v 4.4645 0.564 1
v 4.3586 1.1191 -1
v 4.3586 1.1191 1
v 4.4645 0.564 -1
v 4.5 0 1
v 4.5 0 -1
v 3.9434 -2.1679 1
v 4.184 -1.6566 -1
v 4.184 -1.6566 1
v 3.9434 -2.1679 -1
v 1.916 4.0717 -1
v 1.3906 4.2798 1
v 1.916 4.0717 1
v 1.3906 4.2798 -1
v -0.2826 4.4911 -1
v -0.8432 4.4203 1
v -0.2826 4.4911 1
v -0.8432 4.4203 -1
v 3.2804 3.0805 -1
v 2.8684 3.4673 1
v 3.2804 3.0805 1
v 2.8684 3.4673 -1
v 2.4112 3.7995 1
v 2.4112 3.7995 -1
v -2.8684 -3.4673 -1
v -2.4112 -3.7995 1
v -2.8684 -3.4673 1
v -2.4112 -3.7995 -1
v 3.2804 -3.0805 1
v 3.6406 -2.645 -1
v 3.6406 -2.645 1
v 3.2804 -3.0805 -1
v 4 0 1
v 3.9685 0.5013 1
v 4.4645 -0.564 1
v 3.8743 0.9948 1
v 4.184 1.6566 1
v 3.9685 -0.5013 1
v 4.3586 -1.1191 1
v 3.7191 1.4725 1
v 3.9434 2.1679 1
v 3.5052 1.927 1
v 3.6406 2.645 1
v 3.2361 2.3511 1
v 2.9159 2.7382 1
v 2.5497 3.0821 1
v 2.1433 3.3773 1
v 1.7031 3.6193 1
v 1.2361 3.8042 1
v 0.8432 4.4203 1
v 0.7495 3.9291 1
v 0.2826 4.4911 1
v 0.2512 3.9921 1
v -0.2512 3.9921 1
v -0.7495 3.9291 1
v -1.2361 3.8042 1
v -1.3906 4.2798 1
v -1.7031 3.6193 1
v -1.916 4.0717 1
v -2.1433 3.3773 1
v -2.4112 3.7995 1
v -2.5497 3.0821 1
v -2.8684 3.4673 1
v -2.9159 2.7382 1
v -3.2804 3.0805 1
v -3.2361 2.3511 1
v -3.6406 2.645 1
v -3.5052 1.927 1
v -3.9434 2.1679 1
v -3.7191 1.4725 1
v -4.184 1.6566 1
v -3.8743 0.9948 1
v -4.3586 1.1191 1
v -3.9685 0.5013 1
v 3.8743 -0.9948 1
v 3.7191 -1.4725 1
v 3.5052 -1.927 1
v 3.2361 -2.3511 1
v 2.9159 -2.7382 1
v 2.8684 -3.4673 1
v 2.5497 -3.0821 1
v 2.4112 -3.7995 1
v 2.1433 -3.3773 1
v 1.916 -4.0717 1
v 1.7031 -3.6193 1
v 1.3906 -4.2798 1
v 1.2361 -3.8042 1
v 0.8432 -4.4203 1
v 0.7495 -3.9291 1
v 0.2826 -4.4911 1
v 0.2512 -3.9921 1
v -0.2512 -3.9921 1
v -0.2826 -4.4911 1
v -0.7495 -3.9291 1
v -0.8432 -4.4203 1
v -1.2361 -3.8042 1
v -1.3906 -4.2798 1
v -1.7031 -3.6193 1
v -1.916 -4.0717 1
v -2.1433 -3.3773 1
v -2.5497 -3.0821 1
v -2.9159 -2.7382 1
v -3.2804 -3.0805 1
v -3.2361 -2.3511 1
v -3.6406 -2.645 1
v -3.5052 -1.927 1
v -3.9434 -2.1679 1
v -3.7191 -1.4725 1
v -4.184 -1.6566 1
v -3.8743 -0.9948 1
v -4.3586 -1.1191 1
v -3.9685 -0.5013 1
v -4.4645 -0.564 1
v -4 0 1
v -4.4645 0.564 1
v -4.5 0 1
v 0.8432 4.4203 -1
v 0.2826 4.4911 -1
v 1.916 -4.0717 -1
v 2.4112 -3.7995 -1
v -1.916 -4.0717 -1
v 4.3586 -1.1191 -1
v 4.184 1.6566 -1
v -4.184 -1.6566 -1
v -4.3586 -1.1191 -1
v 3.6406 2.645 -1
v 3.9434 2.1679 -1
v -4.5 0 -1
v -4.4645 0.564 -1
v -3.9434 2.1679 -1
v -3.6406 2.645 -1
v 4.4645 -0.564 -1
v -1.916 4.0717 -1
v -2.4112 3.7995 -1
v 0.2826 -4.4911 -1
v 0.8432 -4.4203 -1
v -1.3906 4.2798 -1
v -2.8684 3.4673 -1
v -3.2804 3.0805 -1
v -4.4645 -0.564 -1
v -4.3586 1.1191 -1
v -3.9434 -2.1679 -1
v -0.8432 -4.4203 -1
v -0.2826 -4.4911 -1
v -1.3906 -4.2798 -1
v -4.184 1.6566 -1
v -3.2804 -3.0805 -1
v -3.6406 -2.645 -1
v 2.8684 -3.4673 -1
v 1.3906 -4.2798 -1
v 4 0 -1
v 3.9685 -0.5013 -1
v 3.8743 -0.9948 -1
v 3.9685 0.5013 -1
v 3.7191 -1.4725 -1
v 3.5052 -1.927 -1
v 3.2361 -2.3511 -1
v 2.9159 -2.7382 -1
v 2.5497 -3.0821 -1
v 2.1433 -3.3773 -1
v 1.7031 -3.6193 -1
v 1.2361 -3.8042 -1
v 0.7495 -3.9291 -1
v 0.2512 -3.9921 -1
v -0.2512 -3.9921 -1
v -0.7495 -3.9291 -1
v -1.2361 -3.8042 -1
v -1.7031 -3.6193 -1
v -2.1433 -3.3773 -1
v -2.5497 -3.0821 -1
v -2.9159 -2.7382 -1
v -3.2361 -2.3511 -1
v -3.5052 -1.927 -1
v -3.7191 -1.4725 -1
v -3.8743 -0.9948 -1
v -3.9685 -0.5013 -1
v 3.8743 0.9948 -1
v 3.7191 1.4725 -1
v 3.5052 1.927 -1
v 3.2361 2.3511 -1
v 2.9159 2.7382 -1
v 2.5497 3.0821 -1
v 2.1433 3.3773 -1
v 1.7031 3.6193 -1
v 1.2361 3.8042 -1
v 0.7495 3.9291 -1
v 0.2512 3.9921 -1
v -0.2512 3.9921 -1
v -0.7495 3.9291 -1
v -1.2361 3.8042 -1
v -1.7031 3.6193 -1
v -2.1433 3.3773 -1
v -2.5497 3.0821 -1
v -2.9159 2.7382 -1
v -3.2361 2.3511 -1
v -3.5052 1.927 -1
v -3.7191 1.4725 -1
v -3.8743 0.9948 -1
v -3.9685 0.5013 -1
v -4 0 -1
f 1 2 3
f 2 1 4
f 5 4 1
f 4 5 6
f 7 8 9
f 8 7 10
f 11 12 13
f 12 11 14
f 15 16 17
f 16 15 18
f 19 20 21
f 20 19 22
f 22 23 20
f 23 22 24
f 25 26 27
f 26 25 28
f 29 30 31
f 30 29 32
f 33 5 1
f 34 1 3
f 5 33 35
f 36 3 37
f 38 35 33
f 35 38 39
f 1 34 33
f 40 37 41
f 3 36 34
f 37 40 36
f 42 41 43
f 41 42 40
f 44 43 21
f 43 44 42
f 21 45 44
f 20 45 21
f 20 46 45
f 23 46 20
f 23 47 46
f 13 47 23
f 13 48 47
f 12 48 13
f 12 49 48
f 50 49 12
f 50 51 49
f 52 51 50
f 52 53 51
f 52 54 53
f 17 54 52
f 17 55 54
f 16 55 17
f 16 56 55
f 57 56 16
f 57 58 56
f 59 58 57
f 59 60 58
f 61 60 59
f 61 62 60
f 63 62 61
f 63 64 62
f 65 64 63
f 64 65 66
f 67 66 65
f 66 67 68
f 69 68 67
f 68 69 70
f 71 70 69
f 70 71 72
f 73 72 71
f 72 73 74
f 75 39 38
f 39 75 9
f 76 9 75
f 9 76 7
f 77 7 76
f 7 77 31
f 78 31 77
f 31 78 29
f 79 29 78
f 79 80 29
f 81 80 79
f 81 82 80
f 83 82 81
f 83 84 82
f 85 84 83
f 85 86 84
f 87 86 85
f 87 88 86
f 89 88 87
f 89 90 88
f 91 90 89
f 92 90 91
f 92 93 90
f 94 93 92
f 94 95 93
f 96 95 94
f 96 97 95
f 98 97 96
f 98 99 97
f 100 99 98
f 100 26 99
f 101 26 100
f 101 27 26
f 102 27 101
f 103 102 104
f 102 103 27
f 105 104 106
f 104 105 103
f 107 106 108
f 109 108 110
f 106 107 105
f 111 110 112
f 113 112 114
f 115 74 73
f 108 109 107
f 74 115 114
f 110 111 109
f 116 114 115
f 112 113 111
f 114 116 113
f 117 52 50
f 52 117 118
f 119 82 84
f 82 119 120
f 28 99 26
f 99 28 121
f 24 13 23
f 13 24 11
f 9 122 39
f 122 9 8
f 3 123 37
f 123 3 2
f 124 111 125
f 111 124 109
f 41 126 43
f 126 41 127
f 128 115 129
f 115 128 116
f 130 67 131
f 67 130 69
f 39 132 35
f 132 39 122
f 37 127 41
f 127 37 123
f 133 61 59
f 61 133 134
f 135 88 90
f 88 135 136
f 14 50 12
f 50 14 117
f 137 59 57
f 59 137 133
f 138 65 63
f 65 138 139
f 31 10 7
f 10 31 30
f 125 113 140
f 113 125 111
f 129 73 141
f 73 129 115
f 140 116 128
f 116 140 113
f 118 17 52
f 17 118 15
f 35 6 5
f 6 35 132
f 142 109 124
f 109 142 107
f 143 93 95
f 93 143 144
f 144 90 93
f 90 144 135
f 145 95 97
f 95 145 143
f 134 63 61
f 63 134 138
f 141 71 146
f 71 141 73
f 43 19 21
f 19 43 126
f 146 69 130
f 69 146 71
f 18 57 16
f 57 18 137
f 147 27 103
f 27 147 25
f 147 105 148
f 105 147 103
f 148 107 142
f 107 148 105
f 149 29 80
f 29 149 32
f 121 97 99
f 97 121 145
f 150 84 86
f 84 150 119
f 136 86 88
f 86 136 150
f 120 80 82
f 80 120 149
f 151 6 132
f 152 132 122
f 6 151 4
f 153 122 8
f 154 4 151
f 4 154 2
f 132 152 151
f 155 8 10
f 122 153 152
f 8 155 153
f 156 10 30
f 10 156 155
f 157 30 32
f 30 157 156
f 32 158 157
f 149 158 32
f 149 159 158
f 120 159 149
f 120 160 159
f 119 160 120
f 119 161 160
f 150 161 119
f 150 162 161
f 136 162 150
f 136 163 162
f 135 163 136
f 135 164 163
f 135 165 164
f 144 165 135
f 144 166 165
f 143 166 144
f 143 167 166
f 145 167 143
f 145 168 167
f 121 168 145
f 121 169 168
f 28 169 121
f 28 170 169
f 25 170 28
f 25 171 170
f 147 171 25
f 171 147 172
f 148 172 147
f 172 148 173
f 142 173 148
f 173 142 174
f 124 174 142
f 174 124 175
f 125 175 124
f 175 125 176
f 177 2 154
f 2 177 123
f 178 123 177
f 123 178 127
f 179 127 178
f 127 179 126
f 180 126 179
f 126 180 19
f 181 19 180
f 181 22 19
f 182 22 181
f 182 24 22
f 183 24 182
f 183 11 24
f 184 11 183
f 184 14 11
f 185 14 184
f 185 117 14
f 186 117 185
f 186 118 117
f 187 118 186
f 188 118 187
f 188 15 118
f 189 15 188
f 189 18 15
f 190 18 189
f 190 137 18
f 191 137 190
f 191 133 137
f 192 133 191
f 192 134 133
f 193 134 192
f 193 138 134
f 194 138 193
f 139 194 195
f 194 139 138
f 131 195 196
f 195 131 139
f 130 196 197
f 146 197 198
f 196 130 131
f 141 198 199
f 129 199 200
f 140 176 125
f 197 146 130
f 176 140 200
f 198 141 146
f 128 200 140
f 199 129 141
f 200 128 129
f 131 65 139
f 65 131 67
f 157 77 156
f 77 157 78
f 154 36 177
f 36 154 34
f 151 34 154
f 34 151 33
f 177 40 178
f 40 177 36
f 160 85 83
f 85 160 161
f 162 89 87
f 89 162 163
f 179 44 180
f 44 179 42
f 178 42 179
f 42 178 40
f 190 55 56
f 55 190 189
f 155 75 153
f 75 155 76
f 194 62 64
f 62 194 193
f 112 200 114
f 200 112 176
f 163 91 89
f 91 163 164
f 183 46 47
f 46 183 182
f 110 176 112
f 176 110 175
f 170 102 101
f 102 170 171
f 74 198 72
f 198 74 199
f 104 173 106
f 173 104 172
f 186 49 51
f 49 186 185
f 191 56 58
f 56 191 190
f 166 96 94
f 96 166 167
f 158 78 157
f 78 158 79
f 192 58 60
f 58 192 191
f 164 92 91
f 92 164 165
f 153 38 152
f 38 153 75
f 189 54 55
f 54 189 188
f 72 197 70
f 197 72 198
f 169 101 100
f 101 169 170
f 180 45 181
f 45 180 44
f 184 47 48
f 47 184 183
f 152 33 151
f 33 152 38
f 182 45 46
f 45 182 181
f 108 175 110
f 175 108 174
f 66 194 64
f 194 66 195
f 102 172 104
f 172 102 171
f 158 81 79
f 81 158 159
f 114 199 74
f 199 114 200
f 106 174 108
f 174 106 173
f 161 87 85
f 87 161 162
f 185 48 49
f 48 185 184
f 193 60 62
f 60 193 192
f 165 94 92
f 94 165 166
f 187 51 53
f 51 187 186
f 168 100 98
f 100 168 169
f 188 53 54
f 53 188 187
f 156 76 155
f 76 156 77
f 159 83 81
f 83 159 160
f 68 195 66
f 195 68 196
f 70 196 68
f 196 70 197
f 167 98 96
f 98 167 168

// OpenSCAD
$fn = 50;


difference() {
	union() {
		translate(v = [0, 0, -1.0000000000]) {
			cylinder(h = 2, r = 4.5000000000);
		}
	}
	union() {
		translate(v = [0, 0, -100.0000000000]) {
			cylinder(h = 200, r = 4.0000000000);
		}
	}
}
